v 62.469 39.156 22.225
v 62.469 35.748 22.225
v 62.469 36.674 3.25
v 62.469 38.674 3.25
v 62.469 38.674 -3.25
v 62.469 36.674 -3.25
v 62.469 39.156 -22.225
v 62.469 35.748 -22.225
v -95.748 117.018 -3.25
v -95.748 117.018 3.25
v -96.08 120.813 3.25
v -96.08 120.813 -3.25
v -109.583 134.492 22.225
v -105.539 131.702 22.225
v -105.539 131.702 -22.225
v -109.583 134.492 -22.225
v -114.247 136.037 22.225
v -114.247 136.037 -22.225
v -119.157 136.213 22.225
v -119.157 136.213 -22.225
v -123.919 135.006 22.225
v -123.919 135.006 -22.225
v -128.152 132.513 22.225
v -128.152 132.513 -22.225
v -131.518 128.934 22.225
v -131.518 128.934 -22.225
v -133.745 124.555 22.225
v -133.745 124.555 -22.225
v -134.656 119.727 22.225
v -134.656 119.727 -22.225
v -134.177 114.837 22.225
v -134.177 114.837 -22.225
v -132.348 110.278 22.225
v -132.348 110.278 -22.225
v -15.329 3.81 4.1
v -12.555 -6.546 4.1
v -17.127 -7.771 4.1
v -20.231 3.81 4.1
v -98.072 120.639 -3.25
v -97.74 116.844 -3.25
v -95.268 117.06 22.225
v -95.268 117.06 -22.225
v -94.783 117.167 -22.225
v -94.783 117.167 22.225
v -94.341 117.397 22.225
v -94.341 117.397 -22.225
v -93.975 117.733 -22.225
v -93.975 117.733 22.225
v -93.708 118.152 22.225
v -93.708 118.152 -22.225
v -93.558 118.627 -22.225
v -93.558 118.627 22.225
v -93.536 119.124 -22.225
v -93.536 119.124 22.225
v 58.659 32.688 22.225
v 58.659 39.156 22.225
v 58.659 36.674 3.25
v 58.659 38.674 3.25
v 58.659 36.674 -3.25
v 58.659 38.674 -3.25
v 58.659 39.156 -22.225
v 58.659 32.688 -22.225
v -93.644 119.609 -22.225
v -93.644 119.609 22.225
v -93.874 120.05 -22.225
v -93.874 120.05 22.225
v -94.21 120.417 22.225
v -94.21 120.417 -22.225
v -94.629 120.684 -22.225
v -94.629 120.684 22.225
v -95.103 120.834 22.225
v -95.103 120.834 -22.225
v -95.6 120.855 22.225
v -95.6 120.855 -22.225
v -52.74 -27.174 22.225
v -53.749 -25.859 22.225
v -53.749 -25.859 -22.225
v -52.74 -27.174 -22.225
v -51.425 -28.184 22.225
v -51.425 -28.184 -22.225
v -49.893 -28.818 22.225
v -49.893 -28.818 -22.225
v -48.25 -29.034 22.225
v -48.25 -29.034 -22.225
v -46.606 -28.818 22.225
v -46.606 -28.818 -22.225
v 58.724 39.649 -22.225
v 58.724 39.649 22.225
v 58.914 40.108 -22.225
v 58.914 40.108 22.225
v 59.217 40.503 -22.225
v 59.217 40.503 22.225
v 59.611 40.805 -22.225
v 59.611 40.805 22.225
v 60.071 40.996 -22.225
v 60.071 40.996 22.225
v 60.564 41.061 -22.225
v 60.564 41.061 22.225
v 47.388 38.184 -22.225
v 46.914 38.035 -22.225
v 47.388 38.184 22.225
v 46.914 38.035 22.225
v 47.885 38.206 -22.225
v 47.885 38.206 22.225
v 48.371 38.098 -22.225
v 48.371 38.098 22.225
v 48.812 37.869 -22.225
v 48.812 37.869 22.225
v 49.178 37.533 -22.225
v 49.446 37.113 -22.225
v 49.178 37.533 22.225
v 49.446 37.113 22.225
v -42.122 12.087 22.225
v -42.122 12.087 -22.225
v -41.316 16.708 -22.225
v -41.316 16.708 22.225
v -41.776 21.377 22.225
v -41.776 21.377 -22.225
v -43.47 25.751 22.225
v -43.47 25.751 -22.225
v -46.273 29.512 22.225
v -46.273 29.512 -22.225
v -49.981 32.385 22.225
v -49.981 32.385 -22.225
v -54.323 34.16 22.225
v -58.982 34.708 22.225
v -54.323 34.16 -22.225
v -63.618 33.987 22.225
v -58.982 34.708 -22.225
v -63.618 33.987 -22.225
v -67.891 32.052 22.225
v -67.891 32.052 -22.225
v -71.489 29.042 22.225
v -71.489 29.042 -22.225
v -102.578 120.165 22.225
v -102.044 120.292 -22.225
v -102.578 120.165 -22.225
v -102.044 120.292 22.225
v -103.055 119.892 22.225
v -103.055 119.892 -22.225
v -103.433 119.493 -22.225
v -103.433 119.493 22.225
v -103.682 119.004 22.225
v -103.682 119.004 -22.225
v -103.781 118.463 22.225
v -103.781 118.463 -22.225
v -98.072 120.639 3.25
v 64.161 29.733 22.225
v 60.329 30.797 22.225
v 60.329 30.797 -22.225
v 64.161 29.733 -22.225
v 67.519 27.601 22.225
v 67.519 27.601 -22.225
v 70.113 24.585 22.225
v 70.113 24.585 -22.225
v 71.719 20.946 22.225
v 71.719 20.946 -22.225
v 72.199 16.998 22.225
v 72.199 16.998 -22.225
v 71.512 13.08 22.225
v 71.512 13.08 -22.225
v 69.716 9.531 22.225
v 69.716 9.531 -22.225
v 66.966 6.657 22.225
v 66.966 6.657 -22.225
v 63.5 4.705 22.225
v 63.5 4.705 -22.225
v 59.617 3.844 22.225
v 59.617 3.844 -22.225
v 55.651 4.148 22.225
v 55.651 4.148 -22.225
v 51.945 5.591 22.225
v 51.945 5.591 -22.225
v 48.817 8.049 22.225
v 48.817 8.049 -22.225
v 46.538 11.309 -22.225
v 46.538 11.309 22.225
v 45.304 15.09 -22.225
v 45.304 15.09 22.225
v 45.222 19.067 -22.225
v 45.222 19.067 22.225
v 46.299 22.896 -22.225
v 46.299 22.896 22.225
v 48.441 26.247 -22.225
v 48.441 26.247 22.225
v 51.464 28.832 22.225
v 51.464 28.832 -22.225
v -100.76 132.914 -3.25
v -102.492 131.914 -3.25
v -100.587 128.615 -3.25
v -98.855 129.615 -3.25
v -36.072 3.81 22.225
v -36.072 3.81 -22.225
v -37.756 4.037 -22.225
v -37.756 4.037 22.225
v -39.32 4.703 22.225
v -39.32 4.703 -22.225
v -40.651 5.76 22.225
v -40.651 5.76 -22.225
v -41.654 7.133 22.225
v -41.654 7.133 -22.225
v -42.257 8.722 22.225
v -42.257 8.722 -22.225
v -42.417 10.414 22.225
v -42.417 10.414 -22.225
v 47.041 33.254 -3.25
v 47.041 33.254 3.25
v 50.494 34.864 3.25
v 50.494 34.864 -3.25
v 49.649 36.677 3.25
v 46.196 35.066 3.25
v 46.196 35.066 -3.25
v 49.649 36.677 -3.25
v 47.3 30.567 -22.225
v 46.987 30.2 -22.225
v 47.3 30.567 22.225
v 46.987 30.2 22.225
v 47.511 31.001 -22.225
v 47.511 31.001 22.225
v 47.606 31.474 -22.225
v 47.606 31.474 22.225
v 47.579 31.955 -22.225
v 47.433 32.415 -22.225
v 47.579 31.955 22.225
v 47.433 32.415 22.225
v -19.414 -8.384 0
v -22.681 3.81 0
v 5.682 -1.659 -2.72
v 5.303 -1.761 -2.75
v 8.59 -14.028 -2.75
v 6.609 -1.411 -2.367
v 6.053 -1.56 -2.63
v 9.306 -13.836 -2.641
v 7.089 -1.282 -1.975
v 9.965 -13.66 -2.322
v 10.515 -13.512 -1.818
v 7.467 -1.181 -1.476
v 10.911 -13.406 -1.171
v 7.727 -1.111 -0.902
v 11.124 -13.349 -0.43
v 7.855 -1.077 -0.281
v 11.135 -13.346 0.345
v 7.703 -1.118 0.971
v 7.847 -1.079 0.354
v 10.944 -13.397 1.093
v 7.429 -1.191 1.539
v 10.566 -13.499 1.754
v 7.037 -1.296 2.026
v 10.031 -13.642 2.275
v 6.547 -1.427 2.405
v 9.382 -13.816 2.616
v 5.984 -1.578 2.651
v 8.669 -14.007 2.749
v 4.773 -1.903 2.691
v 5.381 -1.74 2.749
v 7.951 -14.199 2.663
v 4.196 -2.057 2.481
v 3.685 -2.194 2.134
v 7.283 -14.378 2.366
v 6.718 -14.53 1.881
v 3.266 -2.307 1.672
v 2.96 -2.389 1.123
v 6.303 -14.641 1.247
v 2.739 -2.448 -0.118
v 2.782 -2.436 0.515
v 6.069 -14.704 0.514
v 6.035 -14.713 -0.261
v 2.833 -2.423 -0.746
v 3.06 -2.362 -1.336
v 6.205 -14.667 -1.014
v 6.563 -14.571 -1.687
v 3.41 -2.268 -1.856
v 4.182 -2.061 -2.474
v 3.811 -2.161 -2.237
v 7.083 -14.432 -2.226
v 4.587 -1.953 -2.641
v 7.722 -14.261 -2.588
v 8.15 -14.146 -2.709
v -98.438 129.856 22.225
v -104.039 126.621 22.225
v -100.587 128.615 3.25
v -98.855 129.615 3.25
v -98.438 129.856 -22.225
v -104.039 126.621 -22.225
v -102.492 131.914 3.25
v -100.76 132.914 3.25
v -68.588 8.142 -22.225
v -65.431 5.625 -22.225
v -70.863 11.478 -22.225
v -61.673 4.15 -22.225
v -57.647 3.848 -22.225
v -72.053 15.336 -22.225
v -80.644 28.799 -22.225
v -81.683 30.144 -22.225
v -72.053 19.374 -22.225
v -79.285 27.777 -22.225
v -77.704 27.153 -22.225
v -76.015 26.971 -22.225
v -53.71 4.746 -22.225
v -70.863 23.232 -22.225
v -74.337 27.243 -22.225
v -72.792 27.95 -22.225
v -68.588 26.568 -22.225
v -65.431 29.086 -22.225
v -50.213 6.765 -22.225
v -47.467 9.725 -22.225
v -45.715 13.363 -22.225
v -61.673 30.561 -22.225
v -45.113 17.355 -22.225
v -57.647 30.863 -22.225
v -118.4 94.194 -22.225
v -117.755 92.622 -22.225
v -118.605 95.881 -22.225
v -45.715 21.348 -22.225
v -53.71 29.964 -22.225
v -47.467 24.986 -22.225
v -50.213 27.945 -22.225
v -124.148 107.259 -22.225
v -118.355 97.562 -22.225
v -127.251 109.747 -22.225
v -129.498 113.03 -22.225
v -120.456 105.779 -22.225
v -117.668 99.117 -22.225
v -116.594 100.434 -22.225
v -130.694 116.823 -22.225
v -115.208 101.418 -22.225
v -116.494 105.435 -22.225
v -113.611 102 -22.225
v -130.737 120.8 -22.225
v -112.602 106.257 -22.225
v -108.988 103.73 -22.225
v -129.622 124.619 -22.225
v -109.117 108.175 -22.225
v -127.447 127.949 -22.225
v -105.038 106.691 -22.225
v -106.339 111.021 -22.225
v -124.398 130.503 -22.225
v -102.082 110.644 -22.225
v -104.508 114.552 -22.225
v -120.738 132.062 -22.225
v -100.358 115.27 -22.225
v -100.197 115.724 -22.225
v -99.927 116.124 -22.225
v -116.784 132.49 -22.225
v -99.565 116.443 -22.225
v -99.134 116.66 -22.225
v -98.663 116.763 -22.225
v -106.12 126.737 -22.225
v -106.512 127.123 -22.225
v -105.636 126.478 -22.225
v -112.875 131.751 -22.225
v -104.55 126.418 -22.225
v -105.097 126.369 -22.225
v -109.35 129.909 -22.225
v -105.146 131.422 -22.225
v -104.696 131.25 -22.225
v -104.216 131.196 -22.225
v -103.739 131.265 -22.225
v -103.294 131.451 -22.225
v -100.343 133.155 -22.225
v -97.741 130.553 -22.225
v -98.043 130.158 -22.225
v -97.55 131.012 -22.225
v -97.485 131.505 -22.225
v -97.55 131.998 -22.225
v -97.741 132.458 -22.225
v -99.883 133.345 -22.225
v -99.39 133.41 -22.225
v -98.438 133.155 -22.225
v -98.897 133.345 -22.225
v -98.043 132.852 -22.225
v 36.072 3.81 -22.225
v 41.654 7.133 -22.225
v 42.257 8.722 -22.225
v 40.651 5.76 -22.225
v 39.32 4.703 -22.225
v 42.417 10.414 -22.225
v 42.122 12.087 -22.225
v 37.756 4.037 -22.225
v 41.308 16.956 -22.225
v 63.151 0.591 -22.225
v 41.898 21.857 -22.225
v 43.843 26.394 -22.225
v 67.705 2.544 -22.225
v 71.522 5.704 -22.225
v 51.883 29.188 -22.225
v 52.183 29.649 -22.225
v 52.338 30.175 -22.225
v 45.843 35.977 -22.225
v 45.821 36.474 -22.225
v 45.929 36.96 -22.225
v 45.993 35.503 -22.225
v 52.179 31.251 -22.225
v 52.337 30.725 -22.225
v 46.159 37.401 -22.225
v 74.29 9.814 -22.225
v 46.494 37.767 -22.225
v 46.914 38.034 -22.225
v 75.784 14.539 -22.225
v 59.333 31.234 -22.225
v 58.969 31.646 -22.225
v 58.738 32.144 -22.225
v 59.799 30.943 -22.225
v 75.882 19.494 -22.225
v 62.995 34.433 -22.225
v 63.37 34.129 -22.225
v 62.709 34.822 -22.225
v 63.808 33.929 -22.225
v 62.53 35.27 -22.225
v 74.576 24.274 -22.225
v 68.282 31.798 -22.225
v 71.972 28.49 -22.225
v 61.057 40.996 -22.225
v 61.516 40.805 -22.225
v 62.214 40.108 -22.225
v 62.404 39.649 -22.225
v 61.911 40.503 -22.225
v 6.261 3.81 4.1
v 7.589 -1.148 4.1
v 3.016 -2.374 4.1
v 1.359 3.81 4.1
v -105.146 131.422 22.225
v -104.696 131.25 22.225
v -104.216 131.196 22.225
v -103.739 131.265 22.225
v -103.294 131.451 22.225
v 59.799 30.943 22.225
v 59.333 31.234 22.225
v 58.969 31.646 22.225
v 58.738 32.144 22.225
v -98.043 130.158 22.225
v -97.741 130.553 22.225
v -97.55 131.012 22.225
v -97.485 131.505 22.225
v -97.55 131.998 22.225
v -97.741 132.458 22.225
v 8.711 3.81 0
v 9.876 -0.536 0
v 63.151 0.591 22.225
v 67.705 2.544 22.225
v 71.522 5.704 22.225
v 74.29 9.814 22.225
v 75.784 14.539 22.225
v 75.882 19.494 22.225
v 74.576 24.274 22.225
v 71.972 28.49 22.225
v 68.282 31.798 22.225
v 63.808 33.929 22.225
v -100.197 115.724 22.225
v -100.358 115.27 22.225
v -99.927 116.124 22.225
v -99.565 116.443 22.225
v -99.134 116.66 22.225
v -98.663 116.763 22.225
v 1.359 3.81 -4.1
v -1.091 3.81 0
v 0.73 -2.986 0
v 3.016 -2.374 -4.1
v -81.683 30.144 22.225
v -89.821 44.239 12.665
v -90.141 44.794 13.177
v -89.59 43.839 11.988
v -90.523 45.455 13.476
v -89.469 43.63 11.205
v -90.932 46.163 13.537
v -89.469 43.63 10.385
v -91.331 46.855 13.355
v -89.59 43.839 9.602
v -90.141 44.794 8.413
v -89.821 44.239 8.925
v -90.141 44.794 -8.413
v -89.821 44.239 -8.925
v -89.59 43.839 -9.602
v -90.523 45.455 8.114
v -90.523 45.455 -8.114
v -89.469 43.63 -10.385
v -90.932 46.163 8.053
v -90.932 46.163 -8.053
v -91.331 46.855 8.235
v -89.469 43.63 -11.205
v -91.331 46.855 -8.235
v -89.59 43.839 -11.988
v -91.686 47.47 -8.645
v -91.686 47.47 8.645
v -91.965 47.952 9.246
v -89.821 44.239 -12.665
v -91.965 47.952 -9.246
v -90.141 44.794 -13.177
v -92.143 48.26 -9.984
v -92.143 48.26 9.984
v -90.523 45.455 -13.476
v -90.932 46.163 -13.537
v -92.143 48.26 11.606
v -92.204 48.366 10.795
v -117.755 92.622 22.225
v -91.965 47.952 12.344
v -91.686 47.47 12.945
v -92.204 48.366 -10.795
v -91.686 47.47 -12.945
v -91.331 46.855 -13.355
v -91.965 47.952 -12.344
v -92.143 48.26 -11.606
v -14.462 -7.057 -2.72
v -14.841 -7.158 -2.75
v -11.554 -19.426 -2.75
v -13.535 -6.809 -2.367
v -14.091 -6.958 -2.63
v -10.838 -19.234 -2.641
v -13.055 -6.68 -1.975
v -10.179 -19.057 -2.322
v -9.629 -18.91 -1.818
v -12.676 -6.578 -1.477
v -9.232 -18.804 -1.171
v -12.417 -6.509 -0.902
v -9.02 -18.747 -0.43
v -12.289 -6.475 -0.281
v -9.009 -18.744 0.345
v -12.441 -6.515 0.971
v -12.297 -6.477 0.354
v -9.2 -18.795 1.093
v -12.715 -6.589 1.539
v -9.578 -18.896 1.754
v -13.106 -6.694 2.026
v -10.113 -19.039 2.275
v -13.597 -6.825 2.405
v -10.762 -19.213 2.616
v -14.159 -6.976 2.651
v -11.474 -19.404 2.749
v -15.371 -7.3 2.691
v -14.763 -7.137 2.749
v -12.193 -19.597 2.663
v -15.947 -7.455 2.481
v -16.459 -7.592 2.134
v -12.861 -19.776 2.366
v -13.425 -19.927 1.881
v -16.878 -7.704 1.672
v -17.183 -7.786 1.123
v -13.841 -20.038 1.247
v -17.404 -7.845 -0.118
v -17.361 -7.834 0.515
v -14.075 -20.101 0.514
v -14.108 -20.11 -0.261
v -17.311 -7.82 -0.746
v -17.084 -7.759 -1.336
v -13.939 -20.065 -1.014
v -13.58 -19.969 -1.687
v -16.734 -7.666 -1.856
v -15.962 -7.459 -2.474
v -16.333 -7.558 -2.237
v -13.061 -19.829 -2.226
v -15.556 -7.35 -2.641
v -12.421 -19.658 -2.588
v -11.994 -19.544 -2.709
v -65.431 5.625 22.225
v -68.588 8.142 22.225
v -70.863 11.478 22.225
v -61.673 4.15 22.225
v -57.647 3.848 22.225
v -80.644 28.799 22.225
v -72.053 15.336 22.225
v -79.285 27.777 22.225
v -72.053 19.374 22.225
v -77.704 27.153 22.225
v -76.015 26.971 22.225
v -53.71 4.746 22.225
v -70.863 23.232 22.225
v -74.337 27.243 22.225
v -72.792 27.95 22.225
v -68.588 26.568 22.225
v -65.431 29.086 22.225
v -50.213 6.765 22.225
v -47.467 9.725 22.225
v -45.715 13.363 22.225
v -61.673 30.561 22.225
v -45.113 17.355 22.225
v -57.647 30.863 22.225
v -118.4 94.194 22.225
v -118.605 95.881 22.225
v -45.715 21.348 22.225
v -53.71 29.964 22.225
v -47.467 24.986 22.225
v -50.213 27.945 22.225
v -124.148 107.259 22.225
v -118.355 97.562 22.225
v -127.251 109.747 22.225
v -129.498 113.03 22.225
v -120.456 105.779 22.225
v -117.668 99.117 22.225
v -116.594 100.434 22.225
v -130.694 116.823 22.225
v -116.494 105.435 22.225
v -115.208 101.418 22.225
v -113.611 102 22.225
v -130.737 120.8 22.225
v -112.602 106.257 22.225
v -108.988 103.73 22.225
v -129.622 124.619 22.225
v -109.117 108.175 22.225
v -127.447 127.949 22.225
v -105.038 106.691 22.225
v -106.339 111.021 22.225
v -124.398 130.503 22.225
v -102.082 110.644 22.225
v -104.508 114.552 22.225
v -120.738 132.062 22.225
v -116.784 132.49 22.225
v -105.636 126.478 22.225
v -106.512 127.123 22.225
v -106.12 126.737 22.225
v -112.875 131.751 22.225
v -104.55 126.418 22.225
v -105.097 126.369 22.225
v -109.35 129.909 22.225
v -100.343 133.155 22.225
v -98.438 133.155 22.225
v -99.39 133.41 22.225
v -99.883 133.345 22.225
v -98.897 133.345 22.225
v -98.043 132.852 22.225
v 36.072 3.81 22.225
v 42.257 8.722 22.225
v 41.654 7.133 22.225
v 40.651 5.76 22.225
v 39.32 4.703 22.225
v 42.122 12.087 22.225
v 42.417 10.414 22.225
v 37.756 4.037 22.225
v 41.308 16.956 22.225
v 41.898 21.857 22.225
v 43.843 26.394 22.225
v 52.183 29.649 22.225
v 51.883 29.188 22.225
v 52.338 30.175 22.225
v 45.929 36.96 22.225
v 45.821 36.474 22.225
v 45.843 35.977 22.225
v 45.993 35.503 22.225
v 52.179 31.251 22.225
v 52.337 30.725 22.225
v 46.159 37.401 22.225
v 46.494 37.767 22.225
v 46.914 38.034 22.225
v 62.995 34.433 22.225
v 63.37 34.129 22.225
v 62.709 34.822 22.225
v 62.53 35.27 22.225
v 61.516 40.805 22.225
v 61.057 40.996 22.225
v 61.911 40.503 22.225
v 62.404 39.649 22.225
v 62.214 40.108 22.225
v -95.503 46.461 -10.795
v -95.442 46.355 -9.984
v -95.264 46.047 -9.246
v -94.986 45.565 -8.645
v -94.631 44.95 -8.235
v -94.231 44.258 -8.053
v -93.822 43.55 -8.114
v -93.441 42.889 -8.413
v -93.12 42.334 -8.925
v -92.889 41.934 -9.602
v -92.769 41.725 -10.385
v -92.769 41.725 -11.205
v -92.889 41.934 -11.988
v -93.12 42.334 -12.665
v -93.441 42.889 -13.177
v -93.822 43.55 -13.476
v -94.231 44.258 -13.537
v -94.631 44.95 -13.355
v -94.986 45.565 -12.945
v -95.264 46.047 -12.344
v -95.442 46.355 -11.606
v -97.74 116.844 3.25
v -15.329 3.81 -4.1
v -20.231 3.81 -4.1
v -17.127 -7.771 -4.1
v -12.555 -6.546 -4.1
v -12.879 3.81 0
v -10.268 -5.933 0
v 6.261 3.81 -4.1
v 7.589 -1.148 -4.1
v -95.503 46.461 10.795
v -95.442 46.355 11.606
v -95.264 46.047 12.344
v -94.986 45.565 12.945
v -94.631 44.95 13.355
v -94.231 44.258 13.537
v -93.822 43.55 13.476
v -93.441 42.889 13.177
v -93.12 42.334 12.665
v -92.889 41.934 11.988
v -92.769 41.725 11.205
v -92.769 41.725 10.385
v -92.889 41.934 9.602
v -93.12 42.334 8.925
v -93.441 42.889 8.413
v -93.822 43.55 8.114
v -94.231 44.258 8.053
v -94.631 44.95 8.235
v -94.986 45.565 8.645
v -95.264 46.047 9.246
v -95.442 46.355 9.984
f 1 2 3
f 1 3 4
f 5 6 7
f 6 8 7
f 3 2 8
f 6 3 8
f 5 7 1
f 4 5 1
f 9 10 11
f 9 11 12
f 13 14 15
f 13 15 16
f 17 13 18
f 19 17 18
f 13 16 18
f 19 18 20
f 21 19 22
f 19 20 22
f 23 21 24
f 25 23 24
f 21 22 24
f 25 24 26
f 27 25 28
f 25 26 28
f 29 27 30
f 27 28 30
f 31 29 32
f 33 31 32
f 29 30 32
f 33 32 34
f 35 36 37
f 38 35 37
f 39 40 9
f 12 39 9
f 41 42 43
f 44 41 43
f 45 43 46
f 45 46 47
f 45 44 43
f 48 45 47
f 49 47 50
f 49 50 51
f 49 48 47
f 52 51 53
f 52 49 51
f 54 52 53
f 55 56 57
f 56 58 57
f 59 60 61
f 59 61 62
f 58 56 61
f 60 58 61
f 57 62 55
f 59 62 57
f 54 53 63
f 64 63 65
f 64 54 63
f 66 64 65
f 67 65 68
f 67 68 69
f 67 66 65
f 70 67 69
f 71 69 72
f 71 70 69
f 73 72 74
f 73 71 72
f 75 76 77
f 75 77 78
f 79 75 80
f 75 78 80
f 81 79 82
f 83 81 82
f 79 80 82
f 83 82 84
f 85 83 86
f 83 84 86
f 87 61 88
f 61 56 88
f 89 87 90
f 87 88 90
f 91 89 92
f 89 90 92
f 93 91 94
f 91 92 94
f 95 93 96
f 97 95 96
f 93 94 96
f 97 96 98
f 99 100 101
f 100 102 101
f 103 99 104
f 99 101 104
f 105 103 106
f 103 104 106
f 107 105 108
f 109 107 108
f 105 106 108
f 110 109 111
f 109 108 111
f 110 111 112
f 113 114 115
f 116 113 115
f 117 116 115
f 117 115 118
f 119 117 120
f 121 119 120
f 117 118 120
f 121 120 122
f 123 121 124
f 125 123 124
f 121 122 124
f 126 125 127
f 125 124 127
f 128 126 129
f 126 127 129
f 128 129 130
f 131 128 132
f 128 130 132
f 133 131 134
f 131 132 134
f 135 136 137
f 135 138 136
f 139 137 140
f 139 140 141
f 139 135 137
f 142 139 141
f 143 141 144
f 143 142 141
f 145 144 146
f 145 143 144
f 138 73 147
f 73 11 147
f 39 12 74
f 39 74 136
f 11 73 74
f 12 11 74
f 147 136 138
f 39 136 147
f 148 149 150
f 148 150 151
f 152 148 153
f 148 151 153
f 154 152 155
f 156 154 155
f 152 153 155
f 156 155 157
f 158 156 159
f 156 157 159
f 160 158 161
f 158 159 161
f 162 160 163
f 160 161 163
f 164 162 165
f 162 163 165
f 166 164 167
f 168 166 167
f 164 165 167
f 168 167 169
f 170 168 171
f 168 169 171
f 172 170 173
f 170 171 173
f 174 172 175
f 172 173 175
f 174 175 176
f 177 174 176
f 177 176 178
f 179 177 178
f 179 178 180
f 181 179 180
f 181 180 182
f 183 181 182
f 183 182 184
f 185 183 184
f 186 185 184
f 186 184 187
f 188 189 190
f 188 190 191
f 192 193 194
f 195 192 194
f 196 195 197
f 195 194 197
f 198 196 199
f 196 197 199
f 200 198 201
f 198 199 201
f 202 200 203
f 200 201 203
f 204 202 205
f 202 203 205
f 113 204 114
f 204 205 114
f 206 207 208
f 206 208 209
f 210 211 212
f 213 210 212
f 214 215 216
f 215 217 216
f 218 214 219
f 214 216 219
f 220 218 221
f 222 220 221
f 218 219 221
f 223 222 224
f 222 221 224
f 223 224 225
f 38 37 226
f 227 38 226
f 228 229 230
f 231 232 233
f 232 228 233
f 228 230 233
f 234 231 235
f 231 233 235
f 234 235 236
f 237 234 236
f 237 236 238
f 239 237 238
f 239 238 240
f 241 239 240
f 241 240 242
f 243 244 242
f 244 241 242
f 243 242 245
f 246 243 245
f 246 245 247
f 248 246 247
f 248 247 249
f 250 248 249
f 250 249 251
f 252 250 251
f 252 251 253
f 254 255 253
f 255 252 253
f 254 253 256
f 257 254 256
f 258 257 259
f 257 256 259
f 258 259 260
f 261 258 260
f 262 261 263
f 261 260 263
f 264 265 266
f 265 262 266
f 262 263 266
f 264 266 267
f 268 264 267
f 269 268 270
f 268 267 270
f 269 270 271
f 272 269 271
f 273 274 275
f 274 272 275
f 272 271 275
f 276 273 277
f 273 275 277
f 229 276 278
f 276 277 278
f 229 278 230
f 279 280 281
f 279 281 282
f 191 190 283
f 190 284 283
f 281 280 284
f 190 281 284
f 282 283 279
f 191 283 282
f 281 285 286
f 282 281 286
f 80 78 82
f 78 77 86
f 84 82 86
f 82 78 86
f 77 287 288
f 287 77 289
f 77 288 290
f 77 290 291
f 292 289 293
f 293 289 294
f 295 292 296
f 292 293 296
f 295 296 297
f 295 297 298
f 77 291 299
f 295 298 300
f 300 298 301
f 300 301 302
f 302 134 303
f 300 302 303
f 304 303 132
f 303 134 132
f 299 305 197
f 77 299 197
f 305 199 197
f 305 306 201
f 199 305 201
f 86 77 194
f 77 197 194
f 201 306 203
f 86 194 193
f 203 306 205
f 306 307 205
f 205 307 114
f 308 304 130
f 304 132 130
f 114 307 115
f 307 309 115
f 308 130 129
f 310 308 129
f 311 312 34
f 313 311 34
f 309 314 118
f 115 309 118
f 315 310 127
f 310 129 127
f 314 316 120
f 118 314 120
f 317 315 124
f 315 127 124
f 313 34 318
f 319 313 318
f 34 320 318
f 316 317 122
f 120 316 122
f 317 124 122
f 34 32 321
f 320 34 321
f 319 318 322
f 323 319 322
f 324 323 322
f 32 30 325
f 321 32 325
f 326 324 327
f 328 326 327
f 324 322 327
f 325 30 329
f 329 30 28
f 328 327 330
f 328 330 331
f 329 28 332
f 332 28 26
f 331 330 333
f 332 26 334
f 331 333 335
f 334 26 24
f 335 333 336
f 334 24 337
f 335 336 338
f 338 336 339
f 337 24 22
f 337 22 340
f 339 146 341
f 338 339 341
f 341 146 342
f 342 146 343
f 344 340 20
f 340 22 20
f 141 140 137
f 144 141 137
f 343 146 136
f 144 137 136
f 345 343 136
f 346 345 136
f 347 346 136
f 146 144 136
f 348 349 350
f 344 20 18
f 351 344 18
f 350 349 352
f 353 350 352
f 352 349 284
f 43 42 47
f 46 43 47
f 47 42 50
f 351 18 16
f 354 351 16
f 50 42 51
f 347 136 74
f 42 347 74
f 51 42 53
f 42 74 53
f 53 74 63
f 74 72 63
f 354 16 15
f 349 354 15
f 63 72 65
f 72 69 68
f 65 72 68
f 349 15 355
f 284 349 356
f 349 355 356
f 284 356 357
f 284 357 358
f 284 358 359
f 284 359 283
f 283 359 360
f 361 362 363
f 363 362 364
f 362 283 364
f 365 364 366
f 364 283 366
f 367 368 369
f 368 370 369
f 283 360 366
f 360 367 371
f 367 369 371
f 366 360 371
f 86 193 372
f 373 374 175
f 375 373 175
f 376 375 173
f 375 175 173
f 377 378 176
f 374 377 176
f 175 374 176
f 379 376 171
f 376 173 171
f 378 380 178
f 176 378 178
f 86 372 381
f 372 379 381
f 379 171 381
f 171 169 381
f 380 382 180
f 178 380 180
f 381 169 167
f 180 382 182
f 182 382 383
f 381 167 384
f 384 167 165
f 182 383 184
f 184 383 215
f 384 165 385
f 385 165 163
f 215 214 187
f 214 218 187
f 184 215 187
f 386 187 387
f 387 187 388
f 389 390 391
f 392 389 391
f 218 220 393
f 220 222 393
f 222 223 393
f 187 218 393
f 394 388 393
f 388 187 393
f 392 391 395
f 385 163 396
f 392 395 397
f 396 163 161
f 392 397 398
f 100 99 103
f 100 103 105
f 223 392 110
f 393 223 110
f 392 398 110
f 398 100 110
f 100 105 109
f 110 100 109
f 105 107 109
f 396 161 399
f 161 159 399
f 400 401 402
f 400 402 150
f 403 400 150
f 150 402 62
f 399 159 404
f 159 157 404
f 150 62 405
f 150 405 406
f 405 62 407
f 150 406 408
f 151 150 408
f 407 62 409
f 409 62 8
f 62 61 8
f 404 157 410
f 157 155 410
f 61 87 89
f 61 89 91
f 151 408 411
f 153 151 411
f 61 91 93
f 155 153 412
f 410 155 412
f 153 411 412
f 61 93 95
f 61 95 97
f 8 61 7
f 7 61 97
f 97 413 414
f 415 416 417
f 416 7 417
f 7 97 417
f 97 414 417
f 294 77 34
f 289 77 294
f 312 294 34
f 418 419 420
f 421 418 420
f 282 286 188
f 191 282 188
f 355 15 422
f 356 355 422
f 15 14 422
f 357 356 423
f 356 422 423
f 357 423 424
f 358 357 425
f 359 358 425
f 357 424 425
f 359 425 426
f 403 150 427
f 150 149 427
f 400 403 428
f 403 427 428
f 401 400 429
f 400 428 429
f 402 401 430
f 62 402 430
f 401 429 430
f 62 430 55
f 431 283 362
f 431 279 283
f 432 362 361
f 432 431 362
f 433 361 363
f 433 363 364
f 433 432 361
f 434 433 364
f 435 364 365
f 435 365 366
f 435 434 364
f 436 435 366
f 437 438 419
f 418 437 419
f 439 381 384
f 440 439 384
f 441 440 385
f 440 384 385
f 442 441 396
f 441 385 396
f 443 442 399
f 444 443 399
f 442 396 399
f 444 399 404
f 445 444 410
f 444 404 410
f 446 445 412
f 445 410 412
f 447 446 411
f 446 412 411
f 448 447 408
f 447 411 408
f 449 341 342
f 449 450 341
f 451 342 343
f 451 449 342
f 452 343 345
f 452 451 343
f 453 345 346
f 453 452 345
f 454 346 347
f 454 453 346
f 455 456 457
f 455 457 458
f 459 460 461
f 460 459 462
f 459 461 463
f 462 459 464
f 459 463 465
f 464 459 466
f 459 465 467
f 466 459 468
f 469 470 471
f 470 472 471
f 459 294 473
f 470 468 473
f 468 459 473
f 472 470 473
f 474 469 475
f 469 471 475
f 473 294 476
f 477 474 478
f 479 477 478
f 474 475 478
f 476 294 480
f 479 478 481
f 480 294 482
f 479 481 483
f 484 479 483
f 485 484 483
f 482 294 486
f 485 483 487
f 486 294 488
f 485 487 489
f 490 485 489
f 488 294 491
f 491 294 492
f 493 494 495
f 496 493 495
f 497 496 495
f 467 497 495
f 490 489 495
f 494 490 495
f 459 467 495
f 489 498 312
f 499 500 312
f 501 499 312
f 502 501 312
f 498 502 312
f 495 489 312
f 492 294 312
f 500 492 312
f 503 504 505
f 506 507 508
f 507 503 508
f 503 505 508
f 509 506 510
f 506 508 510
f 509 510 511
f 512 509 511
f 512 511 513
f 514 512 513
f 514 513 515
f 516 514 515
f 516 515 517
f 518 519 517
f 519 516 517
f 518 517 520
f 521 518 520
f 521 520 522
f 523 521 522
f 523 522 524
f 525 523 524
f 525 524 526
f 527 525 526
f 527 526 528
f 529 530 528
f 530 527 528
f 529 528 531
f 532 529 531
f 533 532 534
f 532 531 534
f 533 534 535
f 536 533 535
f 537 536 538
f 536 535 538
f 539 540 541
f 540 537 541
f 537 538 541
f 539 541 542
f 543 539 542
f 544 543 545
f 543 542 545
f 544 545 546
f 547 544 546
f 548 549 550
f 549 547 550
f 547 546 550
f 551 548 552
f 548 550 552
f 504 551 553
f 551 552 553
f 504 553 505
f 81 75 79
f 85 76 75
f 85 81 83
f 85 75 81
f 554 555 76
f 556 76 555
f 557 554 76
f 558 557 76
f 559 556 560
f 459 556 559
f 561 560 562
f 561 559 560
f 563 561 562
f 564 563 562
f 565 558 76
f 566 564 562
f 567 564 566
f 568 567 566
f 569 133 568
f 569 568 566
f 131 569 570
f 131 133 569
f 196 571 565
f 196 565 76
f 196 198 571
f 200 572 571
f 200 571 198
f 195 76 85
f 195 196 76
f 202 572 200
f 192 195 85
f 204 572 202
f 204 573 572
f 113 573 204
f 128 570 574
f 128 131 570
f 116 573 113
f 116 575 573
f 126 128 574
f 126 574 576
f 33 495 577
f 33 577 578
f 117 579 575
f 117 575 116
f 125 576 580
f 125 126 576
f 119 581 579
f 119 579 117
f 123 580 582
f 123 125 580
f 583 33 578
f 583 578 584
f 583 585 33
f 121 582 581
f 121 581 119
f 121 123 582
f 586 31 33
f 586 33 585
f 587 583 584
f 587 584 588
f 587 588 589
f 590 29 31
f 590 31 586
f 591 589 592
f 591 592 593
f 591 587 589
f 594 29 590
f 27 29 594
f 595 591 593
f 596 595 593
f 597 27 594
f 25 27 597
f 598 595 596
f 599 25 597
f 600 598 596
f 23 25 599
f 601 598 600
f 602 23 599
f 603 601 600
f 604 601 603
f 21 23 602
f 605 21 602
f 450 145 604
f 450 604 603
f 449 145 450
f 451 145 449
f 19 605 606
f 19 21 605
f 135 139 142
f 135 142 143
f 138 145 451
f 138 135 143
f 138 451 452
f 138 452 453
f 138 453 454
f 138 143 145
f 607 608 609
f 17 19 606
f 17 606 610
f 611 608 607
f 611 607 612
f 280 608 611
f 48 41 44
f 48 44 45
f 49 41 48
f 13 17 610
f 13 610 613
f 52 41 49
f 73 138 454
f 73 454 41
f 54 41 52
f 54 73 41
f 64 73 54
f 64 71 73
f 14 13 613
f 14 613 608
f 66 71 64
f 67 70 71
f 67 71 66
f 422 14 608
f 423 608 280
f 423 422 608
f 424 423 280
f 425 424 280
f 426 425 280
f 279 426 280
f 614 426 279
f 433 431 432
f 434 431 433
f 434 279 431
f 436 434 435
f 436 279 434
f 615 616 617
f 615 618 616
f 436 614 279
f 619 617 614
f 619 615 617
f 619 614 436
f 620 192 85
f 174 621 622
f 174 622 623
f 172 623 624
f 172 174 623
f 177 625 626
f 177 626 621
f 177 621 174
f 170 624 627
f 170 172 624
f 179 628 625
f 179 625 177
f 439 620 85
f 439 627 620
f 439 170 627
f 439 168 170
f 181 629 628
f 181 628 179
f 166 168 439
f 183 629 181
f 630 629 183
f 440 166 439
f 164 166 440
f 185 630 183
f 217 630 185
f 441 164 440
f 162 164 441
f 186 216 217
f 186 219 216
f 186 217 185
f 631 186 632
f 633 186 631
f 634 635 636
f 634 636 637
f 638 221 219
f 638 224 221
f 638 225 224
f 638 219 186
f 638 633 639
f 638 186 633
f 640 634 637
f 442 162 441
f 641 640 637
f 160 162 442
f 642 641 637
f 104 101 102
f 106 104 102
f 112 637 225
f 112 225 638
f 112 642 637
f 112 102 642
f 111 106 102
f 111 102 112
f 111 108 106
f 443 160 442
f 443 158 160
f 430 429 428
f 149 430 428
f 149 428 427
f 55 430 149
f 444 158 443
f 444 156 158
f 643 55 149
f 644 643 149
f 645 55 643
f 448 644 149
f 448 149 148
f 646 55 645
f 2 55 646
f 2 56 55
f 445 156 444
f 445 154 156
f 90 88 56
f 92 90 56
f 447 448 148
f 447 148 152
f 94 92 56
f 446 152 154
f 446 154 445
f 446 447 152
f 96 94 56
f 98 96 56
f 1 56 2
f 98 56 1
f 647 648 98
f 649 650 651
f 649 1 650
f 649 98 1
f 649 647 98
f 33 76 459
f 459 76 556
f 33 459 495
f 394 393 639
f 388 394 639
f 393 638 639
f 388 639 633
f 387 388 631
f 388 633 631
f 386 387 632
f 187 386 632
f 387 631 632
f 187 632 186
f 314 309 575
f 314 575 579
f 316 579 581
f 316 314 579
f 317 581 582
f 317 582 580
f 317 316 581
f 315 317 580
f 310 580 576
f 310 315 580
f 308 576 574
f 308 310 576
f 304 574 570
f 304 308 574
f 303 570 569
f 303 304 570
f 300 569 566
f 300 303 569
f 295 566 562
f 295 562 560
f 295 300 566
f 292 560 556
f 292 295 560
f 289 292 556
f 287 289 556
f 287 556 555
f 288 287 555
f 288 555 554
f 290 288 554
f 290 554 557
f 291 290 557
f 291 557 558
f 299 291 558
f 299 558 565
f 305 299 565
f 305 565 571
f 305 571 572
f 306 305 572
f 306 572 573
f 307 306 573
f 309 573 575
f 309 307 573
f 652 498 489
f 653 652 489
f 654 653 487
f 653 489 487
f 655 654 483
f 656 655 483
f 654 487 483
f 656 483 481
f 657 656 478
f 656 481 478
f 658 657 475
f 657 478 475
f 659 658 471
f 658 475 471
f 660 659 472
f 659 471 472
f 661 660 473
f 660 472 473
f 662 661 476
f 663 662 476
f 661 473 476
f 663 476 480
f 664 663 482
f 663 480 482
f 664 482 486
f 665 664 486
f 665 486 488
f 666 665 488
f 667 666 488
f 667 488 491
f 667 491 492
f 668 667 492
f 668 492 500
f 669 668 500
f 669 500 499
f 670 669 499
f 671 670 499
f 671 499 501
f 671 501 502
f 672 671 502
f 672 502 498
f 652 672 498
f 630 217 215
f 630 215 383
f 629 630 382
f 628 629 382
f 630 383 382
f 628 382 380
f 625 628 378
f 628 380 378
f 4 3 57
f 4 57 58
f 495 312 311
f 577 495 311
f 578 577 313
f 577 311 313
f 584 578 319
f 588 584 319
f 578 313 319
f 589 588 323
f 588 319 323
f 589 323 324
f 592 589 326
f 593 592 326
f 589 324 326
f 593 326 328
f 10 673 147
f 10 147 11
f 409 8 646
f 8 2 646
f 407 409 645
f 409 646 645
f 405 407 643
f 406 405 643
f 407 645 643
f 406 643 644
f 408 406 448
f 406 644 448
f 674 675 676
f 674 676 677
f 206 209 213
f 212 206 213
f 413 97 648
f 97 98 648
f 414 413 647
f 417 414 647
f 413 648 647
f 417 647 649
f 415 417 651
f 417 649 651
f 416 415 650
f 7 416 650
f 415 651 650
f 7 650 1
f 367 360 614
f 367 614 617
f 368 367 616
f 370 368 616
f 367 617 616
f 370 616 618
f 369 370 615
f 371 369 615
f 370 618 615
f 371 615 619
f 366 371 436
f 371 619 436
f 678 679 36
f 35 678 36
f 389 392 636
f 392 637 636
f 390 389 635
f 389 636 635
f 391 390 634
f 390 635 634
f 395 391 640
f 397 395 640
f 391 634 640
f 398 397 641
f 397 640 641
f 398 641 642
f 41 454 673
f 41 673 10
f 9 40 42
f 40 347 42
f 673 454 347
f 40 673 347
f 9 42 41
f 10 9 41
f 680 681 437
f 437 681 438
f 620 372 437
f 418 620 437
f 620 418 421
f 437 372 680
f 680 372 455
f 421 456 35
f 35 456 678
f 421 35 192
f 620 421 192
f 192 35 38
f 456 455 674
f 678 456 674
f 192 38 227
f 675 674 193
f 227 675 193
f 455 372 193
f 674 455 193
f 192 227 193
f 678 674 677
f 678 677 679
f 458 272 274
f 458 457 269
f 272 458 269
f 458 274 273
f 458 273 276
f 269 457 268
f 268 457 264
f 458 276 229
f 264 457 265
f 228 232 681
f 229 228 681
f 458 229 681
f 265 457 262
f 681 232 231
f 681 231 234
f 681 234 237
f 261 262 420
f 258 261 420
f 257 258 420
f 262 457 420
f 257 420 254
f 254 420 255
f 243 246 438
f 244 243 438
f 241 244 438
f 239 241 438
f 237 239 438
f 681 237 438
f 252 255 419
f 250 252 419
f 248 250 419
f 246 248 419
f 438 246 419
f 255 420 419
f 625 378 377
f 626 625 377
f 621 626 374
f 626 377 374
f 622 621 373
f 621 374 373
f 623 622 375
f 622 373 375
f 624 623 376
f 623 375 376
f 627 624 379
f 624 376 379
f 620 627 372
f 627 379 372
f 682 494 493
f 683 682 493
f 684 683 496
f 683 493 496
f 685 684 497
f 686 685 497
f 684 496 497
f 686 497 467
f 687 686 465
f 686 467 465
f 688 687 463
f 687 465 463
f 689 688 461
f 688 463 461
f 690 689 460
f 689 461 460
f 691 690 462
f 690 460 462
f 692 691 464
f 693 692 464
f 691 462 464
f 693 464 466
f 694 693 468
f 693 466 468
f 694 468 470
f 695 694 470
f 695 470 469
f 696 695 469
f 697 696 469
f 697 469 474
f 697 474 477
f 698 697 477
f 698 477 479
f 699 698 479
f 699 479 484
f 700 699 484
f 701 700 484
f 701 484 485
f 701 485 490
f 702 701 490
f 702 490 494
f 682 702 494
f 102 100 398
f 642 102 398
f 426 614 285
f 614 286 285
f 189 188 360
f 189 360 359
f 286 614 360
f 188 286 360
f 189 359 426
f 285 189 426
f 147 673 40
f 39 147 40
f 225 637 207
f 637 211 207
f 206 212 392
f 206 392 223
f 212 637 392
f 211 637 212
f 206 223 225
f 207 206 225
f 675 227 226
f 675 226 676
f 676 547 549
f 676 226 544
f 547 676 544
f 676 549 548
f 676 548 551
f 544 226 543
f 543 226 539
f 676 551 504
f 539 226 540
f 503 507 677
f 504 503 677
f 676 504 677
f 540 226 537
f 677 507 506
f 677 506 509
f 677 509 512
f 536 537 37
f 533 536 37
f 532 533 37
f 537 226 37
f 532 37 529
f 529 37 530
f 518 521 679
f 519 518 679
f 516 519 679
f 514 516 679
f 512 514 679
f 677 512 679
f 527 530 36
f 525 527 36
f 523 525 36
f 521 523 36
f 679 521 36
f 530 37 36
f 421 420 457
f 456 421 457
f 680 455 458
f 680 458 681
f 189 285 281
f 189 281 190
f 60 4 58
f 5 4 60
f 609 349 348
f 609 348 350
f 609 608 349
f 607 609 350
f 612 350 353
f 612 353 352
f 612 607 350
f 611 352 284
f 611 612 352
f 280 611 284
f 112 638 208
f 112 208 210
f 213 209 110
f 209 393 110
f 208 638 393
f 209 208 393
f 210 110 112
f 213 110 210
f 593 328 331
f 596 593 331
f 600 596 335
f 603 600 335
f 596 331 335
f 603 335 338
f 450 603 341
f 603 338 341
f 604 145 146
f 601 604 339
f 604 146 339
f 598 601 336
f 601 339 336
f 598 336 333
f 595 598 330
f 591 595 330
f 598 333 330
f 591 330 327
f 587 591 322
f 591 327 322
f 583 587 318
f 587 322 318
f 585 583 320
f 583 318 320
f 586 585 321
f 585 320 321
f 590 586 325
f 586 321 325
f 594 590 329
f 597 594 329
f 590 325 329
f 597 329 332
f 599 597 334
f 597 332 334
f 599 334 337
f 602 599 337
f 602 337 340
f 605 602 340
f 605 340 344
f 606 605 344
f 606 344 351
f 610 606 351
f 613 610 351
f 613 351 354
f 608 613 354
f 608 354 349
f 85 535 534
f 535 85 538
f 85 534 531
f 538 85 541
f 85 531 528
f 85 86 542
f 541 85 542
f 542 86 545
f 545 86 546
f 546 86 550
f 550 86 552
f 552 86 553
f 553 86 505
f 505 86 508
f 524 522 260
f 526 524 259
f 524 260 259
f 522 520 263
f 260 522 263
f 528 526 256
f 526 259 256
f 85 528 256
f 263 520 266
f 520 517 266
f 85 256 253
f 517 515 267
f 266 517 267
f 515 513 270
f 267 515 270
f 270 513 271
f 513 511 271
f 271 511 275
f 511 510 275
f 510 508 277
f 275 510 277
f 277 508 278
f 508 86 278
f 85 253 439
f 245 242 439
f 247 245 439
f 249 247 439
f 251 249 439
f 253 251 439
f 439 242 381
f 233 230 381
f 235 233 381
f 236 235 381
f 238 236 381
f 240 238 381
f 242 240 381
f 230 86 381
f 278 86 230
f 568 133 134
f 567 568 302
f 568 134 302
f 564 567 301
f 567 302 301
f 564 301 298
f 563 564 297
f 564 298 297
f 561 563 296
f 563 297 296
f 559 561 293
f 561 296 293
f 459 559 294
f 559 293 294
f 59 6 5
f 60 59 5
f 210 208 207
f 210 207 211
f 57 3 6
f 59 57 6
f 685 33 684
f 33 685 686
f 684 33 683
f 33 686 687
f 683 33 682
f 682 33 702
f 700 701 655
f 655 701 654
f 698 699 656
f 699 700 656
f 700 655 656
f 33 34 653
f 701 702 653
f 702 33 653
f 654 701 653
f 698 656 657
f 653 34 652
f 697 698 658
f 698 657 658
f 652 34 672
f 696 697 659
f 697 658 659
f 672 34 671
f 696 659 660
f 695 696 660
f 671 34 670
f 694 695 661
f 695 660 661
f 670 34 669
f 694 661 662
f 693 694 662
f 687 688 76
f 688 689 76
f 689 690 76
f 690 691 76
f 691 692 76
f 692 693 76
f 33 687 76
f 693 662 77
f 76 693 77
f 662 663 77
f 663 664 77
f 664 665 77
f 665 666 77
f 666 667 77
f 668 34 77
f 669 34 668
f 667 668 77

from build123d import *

# Parameters (mm, degrees)
SKETCH3_W               = 114.3
SKETCH3_H               = 19.05
BOSS_EXTRUDE1_DEPTH     = 3.81
BOSS_EXTRUDE2_START     = -22.225
BOSS_EXTRUDE2_OUTLINE_R = 13.5453125
BOSS_EXTRUDE2_DEPTH     = 44.45
SKETCH6_R               = 2.749999961
CUT_EXTRUDE5_DEPTH      = 7.62
CUT_EXTRUDE7_REACH      = 208.672
SKETCH7_RX              = 2.749999961
SKETCH7_RY              = 2.656295985
CUT_EXTRUDE8_REACH      = 221.372
CUT_EXTRUDE8_START      = -12.7
CUT_EXTRUDE9_REACH      = 237.378
SKETCH14_W              = 2
SKETCH14_H              = 6.499999954
MIRROR2_COPY_1_REACH    = 237.378
MIRROR2_COPY_1_SKETCH_W = 2
MIRROR2_COPY_1_SKETCH_H = 6.499999954
FILLET1_R               = 1.905


# Read off the part's stored shape, not the designer's step: Boss-Extrude2
with BuildPart() as part:
    # Sketch3 → Boss-Extrude1 (new body)
    with BuildSketch(Plane(origin=(0, 0, 0), x_dir=(1, 0, 0), z_dir=(0, 1, 0))):
        Rectangle(SKETCH3_W, SKETCH3_H)
    extrude(amount=BOSS_EXTRUDE1_DEPTH)

    # Boss-Extrude2 outline → Boss-Extrude2 (add)
    with BuildSketch(Plane.XY.offset(BOSS_EXTRUDE2_START)):
        with BuildLine():
            ThreePointArc((48.050005342, 31.090690807), (42.090813056, 22.523397373), (42.122274879, 12.087425946))
            ThreePointArc((42.122274879, 12.087425946), (41.198342199, 6.412778013), (36.071859255, 3.81))
            Line((36.071859255, 3.81), (-36.071859255, 3.81))
            ThreePointArc((-36.071859255, 3.81), (-41.198342199, 6.412778013), (-42.122274879, 12.087425946))
            ThreePointArc((-42.122274879, 12.087425946), (-49.981131055, 32.385454016), (-71.489167098, 29.042409074))
            ThreePointArc((-71.489167098, 29.042409074), (-76.865522705, 27.00523428), (-81.682836057, 30.143509735))
            Line((-81.682836057, 30.143509735), (-117.754695312, 92.621802688))
            ThreePointArc((-117.754695312, 92.621802688), (-118.063864905, 98.362856156), (-113.611441977, 102.000329294))
            ThreePointArc((-113.611441977, 102.000329294), (-104.557894696, 107.19106827), (-100.117997084, 116.635526893))
            Line((-100.117997084, 116.635526893), (-93.370404601, 117.225864741))
            Line((-93.370404601, 117.225864741), (-93.702467981, 121.021366541))
            Line((-93.702467981, 121.021366541), (-103.823806114, 120.135864194))
            ThreePointArc((-103.823806114, 120.135864194), (-130.235968745, 114.8821584), (-105.586989883, 125.727968673))
            Line((-105.586989883, 125.727968673), (-96.78817178, 130.807968673))
            Line((-96.78817178, 130.807968673), (-98.69317178, 134.107525461))
            Line((-98.69317178, 134.107525461), (-104.559079836, 130.720841866))
            ThreePointArc((-104.559079836, 130.720841866), (-127.602080191, 132.935148506), (-132.347716126, 110.277656173))
            Line((-132.347716126, 110.277656173), (-53.749017487, -25.859283278))
            ThreePointArc((-53.749017487, -25.859283278), (-50.679795969, -28.55091831), (-46.606255237, -28.817912275))
            Line((-46.606255237, -28.817912275), (63.150672714, 0.591367933))
            ThreePointArc((63.150672714, 0.591367933), (76.010547273, 17.706450636), (62.468787305, 34.28725781))
            Line((62.468787305, 34.28725781), (62.468787305, 41.060625))
            Line((62.468787305, 41.060625), (58.658787305, 41.060625))
            Line((58.658787305, 41.060625), (58.658787305, 30.900625))
            ThreePointArc((58.658787305, 30.900625), (61.590529512, 4.131077991), (52.934290882, 29.631534697))
            Line((52.934290882, 29.631534697), (48.640489342, 38.839621813))
            Line((48.640489342, 38.839621813), (45.187456674, 37.229446236))
            Line((45.187456674, 37.229446236), (48.050005342, 31.090690807))
        make_face()
        with Locations((-58.658787305, 17.3553125)):
            Circle(BOSS_EXTRUDE2_OUTLINE_R, mode=Mode.SUBTRACT)
    extrude(amount=BOSS_EXTRUDE2_DEPTH)

    # Sketch6 → Cut-Extrude5 (cut)
    with BuildSketch(Plane(origin=(-48.209604448, -27.833828106, 0), x_dir=(0, 0, -1), z_dir=(0.8660254037844433, 0.4999999999999923, 0))):
        with Locations(Location((-10.795, 85.238322473, 0), (0, 0, 90))):
            Circle(SKETCH6_R)
        with Locations(Location((10.795, 85.238322473, 0), (0, 0, 90))):
            Circle(SKETCH6_R)
    extrude(amount=-CUT_EXTRUDE5_DEPTH, mode=Mode.SUBTRACT)

    # Cut-Extrude7: up to this plane
    cut_extrude7_end = Plane(origin=(0, 3.81, 0), z_dir=(0, -1, 0))
    # Sketch7 → Cut-Extrude7 (cut, up to the surface)
    with BuildSketch(Plane(origin=(4.082450956, -15.235914386, 0), x_dir=(0.9659258262890681, 0.25881904510252174, 0), z_dir=(0.25881904510252174, -0.9659258262890681, 0)), mode=Mode.PRIVATE) as cut_extrude7_sk1:
        with Locations(Location((4.66627796, 0), (0, 0, -90))):
            Ellipse(SKETCH7_RX, SKETCH7_RY)
    cut_extrude7_tool1 = split(extrude(cut_extrude7_sk1.sketch, amount=-CUT_EXTRUDE7_REACH, mode=Mode.PRIVATE), bisect_by=cut_extrude7_end, keep=Keep.BOTH, mode=Mode.PRIVATE)
    add(cut_extrude7_tool1.solids().sort_by_distance((8.589729, -14.028193, 0))[0], mode=Mode.SUBTRACT)
    # Sketch7 → Cut-Extrude7 (cut, up to the surface)
    with BuildSketch(Plane(origin=(4.082450956, -15.235914386, 0), x_dir=(0.9659258262890681, 0.25881904510252174, 0), z_dir=(0.25881904510252174, -0.9659258262890681, 0)), mode=Mode.PRIVATE) as cut_extrude7_sk2:
        with Locations(Location((-16.18806063, 0), (0, 0, -90))):
            Ellipse(SKETCH7_RX, SKETCH7_RY)
    cut_extrude7_tool2 = split(extrude(cut_extrude7_sk2.sketch, amount=-CUT_EXTRUDE7_REACH, mode=Mode.PRIVATE), bisect_by=cut_extrude7_end, keep=Keep.BOTH, mode=Mode.PRIVATE)
    add(cut_extrude7_tool2.solids().sort_by_distance((-11.554015, -19.425693, 0))[0], mode=Mode.SUBTRACT)

    # Cut-Extrude8: up to this plane
    cut_extrude8_end = Plane(origin=(0, 3.81, 0), z_dir=(0, -1, 0))
    # Sketch11 → Cut-Extrude8 (cut, up to the surface)
    with BuildSketch(Plane(origin=(4.082450956, -15.235914386, 0), x_dir=(0.9659258262890681, 0.25881904510252174, 0), z_dir=(0.25881904510252174, -0.9659258262890681, 0)).offset(CUT_EXTRUDE8_START), mode=Mode.PRIVATE) as cut_extrude8_sk1:
        Polygon((-11.453788359, 0), (-13.820924494, 4.100000055), (-18.555196765, 4.100000055), (-20.9223329, 0), (-18.555196765, -4.100000055), (-13.820924494, -4.100000055), align=None)
    cut_extrude8_tool1 = split(extrude(cut_extrude8_sk1.sketch, amount=-CUT_EXTRUDE8_REACH, mode=Mode.PRIVATE), bisect_by=cut_extrude8_end, keep=Keep.BOTH, mode=Mode.PRIVATE)
    add(cut_extrude8_tool1.solids().sort_by_distance((-14.841017, -7.158435, 0))[0], mode=Mode.SUBTRACT)
    # Sketch11 → Cut-Extrude8 (cut, up to the surface)
    with BuildSketch(Plane(origin=(4.082450956, -15.235914386, 0), x_dir=(0.9659258262890681, 0.25881904510252174, 0), z_dir=(0.25881904510252174, -0.9659258262890681, 0)).offset(CUT_EXTRUDE8_START), mode=Mode.PRIVATE) as cut_extrude8_sk2:
        Polygon((9.400550231, 0), (7.033414095, 4.100000055), (2.299141825, 4.100000055), (-0.067994311, 0), (2.299141825, -4.100000055), (7.033414095, -4.100000055), align=None)
    cut_extrude8_tool2 = split(extrude(cut_extrude8_sk2.sketch, amount=-CUT_EXTRUDE8_REACH, mode=Mode.PRIVATE), bisect_by=cut_extrude8_end, keep=Keep.BOTH, mode=Mode.PRIVATE)
    add(cut_extrude8_tool2.solids().sort_by_distance((5.302727, -1.760935, 0))[0], mode=Mode.SUBTRACT)

    # Sketch14 → Cut-Extrude9 (cut, up to next)
    with BuildSketch(Plane(origin=(-82.743554889, 143.316041067, 0), x_dir=(0.8660254037844421, 0.499999999999994, 0), z_dir=(-0.499999999999994, 0.8660254037844421, 0)), mode=Mode.PRIVATE) as cut_extrude9_sk1:
        with Locations((-21.803714806, 0)):
            Rectangle(SKETCH14_W, SKETCH14_H)
    cut_extrude9_tool1 = extrude(cut_extrude9_sk1.sketch, amount=-CUT_EXTRUDE9_REACH, mode=Mode.PRIVATE) & part.part
    cut_extrude9 = cut_extrude9_tool1.solids().sort_by_distance((-101.626126, 132.414184, 0))[0]
    add(cut_extrude9, mode=Mode.SUBTRACT)

    # Mirror1: Cut-Extrude9 across plane
    add(cut_extrude9.mirror(Plane(origin=(-44.723303861, 141.844198069, 0), x_dir=(0, 0, 1), z_dir=(0.30070579950426285, -0.9537169507482302, 0))), mode=Mode.SUBTRACT)

    # Mirror2: Cut-Extrude9 across plane
    add(cut_extrude9.mirror(Plane(origin=(-51.509161237, 29.738828106, 0), x_dir=(0, 0, 1), z_dir=(0.8660254037844365, -0.500000000000004, 0))), mode=Mode.SUBTRACT)

    # Mirror2 copy 1 sketch → Mirror2 copy 1 (cut, up to next)
    with BuildSketch(Plane(origin=(37.404082957, 53.920945037, 0), x_dir=(-0.42261826174070477, 0.9063077870366477, 0), z_dir=(-0.9063077870366478, -0.42261826174070427, 0)), mode=Mode.PRIVATE) as mirror2_copy_1_sk1:
        with Locations((-21.803714806, 0)):
            Rectangle(MIRROR2_COPY_1_SKETCH_W, MIRROR2_COPY_1_SKETCH_H)
    mirror2_copy_1_tool1 = extrude(mirror2_copy_1_sk1.sketch, amount=-MIRROR2_COPY_1_REACH, mode=Mode.PRIVATE) & part.part
    add(mirror2_copy_1_tool1.solids().sort_by_distance((46.618730656, 34.16006836, 0))[0], mode=Mode.SUBTRACT)

    # Fillet1
    fillet1_edges = [part.edges().sort_by_distance(p)[0] for p in [
        (-105.586989883, 125.727968673, 0),
        (-103.823806114, 120.135864194, 0),
        (-100.117997084, 116.635526893, 0),
        (-104.559079836, 130.720841866, 0),
        (52.934290882, 29.631534697, 0),
        (58.658787305, 30.900625, 0),
        (48.050005342, 31.090690807, 0),
        (62.468787305, 34.28725781, 0),
        (62.468787305, 41.060625, 0),
        (45.187456674, 37.229446236, 0),
        (48.640489342, 38.839621813, 0),
        (58.658787305, 41.060625, 0),
        (-93.370404601, 117.225864741, 0),
        (-93.702467981, 121.021366541, 0),
        (-96.78817178, 130.807968673, 0),
        (-98.69317178, 134.107525461, 0),
    ]]
    fillet(fillet1_edges, radius=FILLET1_R - 0.0001)  # a hair under: the kernel refuses the full size


solid = part.part
